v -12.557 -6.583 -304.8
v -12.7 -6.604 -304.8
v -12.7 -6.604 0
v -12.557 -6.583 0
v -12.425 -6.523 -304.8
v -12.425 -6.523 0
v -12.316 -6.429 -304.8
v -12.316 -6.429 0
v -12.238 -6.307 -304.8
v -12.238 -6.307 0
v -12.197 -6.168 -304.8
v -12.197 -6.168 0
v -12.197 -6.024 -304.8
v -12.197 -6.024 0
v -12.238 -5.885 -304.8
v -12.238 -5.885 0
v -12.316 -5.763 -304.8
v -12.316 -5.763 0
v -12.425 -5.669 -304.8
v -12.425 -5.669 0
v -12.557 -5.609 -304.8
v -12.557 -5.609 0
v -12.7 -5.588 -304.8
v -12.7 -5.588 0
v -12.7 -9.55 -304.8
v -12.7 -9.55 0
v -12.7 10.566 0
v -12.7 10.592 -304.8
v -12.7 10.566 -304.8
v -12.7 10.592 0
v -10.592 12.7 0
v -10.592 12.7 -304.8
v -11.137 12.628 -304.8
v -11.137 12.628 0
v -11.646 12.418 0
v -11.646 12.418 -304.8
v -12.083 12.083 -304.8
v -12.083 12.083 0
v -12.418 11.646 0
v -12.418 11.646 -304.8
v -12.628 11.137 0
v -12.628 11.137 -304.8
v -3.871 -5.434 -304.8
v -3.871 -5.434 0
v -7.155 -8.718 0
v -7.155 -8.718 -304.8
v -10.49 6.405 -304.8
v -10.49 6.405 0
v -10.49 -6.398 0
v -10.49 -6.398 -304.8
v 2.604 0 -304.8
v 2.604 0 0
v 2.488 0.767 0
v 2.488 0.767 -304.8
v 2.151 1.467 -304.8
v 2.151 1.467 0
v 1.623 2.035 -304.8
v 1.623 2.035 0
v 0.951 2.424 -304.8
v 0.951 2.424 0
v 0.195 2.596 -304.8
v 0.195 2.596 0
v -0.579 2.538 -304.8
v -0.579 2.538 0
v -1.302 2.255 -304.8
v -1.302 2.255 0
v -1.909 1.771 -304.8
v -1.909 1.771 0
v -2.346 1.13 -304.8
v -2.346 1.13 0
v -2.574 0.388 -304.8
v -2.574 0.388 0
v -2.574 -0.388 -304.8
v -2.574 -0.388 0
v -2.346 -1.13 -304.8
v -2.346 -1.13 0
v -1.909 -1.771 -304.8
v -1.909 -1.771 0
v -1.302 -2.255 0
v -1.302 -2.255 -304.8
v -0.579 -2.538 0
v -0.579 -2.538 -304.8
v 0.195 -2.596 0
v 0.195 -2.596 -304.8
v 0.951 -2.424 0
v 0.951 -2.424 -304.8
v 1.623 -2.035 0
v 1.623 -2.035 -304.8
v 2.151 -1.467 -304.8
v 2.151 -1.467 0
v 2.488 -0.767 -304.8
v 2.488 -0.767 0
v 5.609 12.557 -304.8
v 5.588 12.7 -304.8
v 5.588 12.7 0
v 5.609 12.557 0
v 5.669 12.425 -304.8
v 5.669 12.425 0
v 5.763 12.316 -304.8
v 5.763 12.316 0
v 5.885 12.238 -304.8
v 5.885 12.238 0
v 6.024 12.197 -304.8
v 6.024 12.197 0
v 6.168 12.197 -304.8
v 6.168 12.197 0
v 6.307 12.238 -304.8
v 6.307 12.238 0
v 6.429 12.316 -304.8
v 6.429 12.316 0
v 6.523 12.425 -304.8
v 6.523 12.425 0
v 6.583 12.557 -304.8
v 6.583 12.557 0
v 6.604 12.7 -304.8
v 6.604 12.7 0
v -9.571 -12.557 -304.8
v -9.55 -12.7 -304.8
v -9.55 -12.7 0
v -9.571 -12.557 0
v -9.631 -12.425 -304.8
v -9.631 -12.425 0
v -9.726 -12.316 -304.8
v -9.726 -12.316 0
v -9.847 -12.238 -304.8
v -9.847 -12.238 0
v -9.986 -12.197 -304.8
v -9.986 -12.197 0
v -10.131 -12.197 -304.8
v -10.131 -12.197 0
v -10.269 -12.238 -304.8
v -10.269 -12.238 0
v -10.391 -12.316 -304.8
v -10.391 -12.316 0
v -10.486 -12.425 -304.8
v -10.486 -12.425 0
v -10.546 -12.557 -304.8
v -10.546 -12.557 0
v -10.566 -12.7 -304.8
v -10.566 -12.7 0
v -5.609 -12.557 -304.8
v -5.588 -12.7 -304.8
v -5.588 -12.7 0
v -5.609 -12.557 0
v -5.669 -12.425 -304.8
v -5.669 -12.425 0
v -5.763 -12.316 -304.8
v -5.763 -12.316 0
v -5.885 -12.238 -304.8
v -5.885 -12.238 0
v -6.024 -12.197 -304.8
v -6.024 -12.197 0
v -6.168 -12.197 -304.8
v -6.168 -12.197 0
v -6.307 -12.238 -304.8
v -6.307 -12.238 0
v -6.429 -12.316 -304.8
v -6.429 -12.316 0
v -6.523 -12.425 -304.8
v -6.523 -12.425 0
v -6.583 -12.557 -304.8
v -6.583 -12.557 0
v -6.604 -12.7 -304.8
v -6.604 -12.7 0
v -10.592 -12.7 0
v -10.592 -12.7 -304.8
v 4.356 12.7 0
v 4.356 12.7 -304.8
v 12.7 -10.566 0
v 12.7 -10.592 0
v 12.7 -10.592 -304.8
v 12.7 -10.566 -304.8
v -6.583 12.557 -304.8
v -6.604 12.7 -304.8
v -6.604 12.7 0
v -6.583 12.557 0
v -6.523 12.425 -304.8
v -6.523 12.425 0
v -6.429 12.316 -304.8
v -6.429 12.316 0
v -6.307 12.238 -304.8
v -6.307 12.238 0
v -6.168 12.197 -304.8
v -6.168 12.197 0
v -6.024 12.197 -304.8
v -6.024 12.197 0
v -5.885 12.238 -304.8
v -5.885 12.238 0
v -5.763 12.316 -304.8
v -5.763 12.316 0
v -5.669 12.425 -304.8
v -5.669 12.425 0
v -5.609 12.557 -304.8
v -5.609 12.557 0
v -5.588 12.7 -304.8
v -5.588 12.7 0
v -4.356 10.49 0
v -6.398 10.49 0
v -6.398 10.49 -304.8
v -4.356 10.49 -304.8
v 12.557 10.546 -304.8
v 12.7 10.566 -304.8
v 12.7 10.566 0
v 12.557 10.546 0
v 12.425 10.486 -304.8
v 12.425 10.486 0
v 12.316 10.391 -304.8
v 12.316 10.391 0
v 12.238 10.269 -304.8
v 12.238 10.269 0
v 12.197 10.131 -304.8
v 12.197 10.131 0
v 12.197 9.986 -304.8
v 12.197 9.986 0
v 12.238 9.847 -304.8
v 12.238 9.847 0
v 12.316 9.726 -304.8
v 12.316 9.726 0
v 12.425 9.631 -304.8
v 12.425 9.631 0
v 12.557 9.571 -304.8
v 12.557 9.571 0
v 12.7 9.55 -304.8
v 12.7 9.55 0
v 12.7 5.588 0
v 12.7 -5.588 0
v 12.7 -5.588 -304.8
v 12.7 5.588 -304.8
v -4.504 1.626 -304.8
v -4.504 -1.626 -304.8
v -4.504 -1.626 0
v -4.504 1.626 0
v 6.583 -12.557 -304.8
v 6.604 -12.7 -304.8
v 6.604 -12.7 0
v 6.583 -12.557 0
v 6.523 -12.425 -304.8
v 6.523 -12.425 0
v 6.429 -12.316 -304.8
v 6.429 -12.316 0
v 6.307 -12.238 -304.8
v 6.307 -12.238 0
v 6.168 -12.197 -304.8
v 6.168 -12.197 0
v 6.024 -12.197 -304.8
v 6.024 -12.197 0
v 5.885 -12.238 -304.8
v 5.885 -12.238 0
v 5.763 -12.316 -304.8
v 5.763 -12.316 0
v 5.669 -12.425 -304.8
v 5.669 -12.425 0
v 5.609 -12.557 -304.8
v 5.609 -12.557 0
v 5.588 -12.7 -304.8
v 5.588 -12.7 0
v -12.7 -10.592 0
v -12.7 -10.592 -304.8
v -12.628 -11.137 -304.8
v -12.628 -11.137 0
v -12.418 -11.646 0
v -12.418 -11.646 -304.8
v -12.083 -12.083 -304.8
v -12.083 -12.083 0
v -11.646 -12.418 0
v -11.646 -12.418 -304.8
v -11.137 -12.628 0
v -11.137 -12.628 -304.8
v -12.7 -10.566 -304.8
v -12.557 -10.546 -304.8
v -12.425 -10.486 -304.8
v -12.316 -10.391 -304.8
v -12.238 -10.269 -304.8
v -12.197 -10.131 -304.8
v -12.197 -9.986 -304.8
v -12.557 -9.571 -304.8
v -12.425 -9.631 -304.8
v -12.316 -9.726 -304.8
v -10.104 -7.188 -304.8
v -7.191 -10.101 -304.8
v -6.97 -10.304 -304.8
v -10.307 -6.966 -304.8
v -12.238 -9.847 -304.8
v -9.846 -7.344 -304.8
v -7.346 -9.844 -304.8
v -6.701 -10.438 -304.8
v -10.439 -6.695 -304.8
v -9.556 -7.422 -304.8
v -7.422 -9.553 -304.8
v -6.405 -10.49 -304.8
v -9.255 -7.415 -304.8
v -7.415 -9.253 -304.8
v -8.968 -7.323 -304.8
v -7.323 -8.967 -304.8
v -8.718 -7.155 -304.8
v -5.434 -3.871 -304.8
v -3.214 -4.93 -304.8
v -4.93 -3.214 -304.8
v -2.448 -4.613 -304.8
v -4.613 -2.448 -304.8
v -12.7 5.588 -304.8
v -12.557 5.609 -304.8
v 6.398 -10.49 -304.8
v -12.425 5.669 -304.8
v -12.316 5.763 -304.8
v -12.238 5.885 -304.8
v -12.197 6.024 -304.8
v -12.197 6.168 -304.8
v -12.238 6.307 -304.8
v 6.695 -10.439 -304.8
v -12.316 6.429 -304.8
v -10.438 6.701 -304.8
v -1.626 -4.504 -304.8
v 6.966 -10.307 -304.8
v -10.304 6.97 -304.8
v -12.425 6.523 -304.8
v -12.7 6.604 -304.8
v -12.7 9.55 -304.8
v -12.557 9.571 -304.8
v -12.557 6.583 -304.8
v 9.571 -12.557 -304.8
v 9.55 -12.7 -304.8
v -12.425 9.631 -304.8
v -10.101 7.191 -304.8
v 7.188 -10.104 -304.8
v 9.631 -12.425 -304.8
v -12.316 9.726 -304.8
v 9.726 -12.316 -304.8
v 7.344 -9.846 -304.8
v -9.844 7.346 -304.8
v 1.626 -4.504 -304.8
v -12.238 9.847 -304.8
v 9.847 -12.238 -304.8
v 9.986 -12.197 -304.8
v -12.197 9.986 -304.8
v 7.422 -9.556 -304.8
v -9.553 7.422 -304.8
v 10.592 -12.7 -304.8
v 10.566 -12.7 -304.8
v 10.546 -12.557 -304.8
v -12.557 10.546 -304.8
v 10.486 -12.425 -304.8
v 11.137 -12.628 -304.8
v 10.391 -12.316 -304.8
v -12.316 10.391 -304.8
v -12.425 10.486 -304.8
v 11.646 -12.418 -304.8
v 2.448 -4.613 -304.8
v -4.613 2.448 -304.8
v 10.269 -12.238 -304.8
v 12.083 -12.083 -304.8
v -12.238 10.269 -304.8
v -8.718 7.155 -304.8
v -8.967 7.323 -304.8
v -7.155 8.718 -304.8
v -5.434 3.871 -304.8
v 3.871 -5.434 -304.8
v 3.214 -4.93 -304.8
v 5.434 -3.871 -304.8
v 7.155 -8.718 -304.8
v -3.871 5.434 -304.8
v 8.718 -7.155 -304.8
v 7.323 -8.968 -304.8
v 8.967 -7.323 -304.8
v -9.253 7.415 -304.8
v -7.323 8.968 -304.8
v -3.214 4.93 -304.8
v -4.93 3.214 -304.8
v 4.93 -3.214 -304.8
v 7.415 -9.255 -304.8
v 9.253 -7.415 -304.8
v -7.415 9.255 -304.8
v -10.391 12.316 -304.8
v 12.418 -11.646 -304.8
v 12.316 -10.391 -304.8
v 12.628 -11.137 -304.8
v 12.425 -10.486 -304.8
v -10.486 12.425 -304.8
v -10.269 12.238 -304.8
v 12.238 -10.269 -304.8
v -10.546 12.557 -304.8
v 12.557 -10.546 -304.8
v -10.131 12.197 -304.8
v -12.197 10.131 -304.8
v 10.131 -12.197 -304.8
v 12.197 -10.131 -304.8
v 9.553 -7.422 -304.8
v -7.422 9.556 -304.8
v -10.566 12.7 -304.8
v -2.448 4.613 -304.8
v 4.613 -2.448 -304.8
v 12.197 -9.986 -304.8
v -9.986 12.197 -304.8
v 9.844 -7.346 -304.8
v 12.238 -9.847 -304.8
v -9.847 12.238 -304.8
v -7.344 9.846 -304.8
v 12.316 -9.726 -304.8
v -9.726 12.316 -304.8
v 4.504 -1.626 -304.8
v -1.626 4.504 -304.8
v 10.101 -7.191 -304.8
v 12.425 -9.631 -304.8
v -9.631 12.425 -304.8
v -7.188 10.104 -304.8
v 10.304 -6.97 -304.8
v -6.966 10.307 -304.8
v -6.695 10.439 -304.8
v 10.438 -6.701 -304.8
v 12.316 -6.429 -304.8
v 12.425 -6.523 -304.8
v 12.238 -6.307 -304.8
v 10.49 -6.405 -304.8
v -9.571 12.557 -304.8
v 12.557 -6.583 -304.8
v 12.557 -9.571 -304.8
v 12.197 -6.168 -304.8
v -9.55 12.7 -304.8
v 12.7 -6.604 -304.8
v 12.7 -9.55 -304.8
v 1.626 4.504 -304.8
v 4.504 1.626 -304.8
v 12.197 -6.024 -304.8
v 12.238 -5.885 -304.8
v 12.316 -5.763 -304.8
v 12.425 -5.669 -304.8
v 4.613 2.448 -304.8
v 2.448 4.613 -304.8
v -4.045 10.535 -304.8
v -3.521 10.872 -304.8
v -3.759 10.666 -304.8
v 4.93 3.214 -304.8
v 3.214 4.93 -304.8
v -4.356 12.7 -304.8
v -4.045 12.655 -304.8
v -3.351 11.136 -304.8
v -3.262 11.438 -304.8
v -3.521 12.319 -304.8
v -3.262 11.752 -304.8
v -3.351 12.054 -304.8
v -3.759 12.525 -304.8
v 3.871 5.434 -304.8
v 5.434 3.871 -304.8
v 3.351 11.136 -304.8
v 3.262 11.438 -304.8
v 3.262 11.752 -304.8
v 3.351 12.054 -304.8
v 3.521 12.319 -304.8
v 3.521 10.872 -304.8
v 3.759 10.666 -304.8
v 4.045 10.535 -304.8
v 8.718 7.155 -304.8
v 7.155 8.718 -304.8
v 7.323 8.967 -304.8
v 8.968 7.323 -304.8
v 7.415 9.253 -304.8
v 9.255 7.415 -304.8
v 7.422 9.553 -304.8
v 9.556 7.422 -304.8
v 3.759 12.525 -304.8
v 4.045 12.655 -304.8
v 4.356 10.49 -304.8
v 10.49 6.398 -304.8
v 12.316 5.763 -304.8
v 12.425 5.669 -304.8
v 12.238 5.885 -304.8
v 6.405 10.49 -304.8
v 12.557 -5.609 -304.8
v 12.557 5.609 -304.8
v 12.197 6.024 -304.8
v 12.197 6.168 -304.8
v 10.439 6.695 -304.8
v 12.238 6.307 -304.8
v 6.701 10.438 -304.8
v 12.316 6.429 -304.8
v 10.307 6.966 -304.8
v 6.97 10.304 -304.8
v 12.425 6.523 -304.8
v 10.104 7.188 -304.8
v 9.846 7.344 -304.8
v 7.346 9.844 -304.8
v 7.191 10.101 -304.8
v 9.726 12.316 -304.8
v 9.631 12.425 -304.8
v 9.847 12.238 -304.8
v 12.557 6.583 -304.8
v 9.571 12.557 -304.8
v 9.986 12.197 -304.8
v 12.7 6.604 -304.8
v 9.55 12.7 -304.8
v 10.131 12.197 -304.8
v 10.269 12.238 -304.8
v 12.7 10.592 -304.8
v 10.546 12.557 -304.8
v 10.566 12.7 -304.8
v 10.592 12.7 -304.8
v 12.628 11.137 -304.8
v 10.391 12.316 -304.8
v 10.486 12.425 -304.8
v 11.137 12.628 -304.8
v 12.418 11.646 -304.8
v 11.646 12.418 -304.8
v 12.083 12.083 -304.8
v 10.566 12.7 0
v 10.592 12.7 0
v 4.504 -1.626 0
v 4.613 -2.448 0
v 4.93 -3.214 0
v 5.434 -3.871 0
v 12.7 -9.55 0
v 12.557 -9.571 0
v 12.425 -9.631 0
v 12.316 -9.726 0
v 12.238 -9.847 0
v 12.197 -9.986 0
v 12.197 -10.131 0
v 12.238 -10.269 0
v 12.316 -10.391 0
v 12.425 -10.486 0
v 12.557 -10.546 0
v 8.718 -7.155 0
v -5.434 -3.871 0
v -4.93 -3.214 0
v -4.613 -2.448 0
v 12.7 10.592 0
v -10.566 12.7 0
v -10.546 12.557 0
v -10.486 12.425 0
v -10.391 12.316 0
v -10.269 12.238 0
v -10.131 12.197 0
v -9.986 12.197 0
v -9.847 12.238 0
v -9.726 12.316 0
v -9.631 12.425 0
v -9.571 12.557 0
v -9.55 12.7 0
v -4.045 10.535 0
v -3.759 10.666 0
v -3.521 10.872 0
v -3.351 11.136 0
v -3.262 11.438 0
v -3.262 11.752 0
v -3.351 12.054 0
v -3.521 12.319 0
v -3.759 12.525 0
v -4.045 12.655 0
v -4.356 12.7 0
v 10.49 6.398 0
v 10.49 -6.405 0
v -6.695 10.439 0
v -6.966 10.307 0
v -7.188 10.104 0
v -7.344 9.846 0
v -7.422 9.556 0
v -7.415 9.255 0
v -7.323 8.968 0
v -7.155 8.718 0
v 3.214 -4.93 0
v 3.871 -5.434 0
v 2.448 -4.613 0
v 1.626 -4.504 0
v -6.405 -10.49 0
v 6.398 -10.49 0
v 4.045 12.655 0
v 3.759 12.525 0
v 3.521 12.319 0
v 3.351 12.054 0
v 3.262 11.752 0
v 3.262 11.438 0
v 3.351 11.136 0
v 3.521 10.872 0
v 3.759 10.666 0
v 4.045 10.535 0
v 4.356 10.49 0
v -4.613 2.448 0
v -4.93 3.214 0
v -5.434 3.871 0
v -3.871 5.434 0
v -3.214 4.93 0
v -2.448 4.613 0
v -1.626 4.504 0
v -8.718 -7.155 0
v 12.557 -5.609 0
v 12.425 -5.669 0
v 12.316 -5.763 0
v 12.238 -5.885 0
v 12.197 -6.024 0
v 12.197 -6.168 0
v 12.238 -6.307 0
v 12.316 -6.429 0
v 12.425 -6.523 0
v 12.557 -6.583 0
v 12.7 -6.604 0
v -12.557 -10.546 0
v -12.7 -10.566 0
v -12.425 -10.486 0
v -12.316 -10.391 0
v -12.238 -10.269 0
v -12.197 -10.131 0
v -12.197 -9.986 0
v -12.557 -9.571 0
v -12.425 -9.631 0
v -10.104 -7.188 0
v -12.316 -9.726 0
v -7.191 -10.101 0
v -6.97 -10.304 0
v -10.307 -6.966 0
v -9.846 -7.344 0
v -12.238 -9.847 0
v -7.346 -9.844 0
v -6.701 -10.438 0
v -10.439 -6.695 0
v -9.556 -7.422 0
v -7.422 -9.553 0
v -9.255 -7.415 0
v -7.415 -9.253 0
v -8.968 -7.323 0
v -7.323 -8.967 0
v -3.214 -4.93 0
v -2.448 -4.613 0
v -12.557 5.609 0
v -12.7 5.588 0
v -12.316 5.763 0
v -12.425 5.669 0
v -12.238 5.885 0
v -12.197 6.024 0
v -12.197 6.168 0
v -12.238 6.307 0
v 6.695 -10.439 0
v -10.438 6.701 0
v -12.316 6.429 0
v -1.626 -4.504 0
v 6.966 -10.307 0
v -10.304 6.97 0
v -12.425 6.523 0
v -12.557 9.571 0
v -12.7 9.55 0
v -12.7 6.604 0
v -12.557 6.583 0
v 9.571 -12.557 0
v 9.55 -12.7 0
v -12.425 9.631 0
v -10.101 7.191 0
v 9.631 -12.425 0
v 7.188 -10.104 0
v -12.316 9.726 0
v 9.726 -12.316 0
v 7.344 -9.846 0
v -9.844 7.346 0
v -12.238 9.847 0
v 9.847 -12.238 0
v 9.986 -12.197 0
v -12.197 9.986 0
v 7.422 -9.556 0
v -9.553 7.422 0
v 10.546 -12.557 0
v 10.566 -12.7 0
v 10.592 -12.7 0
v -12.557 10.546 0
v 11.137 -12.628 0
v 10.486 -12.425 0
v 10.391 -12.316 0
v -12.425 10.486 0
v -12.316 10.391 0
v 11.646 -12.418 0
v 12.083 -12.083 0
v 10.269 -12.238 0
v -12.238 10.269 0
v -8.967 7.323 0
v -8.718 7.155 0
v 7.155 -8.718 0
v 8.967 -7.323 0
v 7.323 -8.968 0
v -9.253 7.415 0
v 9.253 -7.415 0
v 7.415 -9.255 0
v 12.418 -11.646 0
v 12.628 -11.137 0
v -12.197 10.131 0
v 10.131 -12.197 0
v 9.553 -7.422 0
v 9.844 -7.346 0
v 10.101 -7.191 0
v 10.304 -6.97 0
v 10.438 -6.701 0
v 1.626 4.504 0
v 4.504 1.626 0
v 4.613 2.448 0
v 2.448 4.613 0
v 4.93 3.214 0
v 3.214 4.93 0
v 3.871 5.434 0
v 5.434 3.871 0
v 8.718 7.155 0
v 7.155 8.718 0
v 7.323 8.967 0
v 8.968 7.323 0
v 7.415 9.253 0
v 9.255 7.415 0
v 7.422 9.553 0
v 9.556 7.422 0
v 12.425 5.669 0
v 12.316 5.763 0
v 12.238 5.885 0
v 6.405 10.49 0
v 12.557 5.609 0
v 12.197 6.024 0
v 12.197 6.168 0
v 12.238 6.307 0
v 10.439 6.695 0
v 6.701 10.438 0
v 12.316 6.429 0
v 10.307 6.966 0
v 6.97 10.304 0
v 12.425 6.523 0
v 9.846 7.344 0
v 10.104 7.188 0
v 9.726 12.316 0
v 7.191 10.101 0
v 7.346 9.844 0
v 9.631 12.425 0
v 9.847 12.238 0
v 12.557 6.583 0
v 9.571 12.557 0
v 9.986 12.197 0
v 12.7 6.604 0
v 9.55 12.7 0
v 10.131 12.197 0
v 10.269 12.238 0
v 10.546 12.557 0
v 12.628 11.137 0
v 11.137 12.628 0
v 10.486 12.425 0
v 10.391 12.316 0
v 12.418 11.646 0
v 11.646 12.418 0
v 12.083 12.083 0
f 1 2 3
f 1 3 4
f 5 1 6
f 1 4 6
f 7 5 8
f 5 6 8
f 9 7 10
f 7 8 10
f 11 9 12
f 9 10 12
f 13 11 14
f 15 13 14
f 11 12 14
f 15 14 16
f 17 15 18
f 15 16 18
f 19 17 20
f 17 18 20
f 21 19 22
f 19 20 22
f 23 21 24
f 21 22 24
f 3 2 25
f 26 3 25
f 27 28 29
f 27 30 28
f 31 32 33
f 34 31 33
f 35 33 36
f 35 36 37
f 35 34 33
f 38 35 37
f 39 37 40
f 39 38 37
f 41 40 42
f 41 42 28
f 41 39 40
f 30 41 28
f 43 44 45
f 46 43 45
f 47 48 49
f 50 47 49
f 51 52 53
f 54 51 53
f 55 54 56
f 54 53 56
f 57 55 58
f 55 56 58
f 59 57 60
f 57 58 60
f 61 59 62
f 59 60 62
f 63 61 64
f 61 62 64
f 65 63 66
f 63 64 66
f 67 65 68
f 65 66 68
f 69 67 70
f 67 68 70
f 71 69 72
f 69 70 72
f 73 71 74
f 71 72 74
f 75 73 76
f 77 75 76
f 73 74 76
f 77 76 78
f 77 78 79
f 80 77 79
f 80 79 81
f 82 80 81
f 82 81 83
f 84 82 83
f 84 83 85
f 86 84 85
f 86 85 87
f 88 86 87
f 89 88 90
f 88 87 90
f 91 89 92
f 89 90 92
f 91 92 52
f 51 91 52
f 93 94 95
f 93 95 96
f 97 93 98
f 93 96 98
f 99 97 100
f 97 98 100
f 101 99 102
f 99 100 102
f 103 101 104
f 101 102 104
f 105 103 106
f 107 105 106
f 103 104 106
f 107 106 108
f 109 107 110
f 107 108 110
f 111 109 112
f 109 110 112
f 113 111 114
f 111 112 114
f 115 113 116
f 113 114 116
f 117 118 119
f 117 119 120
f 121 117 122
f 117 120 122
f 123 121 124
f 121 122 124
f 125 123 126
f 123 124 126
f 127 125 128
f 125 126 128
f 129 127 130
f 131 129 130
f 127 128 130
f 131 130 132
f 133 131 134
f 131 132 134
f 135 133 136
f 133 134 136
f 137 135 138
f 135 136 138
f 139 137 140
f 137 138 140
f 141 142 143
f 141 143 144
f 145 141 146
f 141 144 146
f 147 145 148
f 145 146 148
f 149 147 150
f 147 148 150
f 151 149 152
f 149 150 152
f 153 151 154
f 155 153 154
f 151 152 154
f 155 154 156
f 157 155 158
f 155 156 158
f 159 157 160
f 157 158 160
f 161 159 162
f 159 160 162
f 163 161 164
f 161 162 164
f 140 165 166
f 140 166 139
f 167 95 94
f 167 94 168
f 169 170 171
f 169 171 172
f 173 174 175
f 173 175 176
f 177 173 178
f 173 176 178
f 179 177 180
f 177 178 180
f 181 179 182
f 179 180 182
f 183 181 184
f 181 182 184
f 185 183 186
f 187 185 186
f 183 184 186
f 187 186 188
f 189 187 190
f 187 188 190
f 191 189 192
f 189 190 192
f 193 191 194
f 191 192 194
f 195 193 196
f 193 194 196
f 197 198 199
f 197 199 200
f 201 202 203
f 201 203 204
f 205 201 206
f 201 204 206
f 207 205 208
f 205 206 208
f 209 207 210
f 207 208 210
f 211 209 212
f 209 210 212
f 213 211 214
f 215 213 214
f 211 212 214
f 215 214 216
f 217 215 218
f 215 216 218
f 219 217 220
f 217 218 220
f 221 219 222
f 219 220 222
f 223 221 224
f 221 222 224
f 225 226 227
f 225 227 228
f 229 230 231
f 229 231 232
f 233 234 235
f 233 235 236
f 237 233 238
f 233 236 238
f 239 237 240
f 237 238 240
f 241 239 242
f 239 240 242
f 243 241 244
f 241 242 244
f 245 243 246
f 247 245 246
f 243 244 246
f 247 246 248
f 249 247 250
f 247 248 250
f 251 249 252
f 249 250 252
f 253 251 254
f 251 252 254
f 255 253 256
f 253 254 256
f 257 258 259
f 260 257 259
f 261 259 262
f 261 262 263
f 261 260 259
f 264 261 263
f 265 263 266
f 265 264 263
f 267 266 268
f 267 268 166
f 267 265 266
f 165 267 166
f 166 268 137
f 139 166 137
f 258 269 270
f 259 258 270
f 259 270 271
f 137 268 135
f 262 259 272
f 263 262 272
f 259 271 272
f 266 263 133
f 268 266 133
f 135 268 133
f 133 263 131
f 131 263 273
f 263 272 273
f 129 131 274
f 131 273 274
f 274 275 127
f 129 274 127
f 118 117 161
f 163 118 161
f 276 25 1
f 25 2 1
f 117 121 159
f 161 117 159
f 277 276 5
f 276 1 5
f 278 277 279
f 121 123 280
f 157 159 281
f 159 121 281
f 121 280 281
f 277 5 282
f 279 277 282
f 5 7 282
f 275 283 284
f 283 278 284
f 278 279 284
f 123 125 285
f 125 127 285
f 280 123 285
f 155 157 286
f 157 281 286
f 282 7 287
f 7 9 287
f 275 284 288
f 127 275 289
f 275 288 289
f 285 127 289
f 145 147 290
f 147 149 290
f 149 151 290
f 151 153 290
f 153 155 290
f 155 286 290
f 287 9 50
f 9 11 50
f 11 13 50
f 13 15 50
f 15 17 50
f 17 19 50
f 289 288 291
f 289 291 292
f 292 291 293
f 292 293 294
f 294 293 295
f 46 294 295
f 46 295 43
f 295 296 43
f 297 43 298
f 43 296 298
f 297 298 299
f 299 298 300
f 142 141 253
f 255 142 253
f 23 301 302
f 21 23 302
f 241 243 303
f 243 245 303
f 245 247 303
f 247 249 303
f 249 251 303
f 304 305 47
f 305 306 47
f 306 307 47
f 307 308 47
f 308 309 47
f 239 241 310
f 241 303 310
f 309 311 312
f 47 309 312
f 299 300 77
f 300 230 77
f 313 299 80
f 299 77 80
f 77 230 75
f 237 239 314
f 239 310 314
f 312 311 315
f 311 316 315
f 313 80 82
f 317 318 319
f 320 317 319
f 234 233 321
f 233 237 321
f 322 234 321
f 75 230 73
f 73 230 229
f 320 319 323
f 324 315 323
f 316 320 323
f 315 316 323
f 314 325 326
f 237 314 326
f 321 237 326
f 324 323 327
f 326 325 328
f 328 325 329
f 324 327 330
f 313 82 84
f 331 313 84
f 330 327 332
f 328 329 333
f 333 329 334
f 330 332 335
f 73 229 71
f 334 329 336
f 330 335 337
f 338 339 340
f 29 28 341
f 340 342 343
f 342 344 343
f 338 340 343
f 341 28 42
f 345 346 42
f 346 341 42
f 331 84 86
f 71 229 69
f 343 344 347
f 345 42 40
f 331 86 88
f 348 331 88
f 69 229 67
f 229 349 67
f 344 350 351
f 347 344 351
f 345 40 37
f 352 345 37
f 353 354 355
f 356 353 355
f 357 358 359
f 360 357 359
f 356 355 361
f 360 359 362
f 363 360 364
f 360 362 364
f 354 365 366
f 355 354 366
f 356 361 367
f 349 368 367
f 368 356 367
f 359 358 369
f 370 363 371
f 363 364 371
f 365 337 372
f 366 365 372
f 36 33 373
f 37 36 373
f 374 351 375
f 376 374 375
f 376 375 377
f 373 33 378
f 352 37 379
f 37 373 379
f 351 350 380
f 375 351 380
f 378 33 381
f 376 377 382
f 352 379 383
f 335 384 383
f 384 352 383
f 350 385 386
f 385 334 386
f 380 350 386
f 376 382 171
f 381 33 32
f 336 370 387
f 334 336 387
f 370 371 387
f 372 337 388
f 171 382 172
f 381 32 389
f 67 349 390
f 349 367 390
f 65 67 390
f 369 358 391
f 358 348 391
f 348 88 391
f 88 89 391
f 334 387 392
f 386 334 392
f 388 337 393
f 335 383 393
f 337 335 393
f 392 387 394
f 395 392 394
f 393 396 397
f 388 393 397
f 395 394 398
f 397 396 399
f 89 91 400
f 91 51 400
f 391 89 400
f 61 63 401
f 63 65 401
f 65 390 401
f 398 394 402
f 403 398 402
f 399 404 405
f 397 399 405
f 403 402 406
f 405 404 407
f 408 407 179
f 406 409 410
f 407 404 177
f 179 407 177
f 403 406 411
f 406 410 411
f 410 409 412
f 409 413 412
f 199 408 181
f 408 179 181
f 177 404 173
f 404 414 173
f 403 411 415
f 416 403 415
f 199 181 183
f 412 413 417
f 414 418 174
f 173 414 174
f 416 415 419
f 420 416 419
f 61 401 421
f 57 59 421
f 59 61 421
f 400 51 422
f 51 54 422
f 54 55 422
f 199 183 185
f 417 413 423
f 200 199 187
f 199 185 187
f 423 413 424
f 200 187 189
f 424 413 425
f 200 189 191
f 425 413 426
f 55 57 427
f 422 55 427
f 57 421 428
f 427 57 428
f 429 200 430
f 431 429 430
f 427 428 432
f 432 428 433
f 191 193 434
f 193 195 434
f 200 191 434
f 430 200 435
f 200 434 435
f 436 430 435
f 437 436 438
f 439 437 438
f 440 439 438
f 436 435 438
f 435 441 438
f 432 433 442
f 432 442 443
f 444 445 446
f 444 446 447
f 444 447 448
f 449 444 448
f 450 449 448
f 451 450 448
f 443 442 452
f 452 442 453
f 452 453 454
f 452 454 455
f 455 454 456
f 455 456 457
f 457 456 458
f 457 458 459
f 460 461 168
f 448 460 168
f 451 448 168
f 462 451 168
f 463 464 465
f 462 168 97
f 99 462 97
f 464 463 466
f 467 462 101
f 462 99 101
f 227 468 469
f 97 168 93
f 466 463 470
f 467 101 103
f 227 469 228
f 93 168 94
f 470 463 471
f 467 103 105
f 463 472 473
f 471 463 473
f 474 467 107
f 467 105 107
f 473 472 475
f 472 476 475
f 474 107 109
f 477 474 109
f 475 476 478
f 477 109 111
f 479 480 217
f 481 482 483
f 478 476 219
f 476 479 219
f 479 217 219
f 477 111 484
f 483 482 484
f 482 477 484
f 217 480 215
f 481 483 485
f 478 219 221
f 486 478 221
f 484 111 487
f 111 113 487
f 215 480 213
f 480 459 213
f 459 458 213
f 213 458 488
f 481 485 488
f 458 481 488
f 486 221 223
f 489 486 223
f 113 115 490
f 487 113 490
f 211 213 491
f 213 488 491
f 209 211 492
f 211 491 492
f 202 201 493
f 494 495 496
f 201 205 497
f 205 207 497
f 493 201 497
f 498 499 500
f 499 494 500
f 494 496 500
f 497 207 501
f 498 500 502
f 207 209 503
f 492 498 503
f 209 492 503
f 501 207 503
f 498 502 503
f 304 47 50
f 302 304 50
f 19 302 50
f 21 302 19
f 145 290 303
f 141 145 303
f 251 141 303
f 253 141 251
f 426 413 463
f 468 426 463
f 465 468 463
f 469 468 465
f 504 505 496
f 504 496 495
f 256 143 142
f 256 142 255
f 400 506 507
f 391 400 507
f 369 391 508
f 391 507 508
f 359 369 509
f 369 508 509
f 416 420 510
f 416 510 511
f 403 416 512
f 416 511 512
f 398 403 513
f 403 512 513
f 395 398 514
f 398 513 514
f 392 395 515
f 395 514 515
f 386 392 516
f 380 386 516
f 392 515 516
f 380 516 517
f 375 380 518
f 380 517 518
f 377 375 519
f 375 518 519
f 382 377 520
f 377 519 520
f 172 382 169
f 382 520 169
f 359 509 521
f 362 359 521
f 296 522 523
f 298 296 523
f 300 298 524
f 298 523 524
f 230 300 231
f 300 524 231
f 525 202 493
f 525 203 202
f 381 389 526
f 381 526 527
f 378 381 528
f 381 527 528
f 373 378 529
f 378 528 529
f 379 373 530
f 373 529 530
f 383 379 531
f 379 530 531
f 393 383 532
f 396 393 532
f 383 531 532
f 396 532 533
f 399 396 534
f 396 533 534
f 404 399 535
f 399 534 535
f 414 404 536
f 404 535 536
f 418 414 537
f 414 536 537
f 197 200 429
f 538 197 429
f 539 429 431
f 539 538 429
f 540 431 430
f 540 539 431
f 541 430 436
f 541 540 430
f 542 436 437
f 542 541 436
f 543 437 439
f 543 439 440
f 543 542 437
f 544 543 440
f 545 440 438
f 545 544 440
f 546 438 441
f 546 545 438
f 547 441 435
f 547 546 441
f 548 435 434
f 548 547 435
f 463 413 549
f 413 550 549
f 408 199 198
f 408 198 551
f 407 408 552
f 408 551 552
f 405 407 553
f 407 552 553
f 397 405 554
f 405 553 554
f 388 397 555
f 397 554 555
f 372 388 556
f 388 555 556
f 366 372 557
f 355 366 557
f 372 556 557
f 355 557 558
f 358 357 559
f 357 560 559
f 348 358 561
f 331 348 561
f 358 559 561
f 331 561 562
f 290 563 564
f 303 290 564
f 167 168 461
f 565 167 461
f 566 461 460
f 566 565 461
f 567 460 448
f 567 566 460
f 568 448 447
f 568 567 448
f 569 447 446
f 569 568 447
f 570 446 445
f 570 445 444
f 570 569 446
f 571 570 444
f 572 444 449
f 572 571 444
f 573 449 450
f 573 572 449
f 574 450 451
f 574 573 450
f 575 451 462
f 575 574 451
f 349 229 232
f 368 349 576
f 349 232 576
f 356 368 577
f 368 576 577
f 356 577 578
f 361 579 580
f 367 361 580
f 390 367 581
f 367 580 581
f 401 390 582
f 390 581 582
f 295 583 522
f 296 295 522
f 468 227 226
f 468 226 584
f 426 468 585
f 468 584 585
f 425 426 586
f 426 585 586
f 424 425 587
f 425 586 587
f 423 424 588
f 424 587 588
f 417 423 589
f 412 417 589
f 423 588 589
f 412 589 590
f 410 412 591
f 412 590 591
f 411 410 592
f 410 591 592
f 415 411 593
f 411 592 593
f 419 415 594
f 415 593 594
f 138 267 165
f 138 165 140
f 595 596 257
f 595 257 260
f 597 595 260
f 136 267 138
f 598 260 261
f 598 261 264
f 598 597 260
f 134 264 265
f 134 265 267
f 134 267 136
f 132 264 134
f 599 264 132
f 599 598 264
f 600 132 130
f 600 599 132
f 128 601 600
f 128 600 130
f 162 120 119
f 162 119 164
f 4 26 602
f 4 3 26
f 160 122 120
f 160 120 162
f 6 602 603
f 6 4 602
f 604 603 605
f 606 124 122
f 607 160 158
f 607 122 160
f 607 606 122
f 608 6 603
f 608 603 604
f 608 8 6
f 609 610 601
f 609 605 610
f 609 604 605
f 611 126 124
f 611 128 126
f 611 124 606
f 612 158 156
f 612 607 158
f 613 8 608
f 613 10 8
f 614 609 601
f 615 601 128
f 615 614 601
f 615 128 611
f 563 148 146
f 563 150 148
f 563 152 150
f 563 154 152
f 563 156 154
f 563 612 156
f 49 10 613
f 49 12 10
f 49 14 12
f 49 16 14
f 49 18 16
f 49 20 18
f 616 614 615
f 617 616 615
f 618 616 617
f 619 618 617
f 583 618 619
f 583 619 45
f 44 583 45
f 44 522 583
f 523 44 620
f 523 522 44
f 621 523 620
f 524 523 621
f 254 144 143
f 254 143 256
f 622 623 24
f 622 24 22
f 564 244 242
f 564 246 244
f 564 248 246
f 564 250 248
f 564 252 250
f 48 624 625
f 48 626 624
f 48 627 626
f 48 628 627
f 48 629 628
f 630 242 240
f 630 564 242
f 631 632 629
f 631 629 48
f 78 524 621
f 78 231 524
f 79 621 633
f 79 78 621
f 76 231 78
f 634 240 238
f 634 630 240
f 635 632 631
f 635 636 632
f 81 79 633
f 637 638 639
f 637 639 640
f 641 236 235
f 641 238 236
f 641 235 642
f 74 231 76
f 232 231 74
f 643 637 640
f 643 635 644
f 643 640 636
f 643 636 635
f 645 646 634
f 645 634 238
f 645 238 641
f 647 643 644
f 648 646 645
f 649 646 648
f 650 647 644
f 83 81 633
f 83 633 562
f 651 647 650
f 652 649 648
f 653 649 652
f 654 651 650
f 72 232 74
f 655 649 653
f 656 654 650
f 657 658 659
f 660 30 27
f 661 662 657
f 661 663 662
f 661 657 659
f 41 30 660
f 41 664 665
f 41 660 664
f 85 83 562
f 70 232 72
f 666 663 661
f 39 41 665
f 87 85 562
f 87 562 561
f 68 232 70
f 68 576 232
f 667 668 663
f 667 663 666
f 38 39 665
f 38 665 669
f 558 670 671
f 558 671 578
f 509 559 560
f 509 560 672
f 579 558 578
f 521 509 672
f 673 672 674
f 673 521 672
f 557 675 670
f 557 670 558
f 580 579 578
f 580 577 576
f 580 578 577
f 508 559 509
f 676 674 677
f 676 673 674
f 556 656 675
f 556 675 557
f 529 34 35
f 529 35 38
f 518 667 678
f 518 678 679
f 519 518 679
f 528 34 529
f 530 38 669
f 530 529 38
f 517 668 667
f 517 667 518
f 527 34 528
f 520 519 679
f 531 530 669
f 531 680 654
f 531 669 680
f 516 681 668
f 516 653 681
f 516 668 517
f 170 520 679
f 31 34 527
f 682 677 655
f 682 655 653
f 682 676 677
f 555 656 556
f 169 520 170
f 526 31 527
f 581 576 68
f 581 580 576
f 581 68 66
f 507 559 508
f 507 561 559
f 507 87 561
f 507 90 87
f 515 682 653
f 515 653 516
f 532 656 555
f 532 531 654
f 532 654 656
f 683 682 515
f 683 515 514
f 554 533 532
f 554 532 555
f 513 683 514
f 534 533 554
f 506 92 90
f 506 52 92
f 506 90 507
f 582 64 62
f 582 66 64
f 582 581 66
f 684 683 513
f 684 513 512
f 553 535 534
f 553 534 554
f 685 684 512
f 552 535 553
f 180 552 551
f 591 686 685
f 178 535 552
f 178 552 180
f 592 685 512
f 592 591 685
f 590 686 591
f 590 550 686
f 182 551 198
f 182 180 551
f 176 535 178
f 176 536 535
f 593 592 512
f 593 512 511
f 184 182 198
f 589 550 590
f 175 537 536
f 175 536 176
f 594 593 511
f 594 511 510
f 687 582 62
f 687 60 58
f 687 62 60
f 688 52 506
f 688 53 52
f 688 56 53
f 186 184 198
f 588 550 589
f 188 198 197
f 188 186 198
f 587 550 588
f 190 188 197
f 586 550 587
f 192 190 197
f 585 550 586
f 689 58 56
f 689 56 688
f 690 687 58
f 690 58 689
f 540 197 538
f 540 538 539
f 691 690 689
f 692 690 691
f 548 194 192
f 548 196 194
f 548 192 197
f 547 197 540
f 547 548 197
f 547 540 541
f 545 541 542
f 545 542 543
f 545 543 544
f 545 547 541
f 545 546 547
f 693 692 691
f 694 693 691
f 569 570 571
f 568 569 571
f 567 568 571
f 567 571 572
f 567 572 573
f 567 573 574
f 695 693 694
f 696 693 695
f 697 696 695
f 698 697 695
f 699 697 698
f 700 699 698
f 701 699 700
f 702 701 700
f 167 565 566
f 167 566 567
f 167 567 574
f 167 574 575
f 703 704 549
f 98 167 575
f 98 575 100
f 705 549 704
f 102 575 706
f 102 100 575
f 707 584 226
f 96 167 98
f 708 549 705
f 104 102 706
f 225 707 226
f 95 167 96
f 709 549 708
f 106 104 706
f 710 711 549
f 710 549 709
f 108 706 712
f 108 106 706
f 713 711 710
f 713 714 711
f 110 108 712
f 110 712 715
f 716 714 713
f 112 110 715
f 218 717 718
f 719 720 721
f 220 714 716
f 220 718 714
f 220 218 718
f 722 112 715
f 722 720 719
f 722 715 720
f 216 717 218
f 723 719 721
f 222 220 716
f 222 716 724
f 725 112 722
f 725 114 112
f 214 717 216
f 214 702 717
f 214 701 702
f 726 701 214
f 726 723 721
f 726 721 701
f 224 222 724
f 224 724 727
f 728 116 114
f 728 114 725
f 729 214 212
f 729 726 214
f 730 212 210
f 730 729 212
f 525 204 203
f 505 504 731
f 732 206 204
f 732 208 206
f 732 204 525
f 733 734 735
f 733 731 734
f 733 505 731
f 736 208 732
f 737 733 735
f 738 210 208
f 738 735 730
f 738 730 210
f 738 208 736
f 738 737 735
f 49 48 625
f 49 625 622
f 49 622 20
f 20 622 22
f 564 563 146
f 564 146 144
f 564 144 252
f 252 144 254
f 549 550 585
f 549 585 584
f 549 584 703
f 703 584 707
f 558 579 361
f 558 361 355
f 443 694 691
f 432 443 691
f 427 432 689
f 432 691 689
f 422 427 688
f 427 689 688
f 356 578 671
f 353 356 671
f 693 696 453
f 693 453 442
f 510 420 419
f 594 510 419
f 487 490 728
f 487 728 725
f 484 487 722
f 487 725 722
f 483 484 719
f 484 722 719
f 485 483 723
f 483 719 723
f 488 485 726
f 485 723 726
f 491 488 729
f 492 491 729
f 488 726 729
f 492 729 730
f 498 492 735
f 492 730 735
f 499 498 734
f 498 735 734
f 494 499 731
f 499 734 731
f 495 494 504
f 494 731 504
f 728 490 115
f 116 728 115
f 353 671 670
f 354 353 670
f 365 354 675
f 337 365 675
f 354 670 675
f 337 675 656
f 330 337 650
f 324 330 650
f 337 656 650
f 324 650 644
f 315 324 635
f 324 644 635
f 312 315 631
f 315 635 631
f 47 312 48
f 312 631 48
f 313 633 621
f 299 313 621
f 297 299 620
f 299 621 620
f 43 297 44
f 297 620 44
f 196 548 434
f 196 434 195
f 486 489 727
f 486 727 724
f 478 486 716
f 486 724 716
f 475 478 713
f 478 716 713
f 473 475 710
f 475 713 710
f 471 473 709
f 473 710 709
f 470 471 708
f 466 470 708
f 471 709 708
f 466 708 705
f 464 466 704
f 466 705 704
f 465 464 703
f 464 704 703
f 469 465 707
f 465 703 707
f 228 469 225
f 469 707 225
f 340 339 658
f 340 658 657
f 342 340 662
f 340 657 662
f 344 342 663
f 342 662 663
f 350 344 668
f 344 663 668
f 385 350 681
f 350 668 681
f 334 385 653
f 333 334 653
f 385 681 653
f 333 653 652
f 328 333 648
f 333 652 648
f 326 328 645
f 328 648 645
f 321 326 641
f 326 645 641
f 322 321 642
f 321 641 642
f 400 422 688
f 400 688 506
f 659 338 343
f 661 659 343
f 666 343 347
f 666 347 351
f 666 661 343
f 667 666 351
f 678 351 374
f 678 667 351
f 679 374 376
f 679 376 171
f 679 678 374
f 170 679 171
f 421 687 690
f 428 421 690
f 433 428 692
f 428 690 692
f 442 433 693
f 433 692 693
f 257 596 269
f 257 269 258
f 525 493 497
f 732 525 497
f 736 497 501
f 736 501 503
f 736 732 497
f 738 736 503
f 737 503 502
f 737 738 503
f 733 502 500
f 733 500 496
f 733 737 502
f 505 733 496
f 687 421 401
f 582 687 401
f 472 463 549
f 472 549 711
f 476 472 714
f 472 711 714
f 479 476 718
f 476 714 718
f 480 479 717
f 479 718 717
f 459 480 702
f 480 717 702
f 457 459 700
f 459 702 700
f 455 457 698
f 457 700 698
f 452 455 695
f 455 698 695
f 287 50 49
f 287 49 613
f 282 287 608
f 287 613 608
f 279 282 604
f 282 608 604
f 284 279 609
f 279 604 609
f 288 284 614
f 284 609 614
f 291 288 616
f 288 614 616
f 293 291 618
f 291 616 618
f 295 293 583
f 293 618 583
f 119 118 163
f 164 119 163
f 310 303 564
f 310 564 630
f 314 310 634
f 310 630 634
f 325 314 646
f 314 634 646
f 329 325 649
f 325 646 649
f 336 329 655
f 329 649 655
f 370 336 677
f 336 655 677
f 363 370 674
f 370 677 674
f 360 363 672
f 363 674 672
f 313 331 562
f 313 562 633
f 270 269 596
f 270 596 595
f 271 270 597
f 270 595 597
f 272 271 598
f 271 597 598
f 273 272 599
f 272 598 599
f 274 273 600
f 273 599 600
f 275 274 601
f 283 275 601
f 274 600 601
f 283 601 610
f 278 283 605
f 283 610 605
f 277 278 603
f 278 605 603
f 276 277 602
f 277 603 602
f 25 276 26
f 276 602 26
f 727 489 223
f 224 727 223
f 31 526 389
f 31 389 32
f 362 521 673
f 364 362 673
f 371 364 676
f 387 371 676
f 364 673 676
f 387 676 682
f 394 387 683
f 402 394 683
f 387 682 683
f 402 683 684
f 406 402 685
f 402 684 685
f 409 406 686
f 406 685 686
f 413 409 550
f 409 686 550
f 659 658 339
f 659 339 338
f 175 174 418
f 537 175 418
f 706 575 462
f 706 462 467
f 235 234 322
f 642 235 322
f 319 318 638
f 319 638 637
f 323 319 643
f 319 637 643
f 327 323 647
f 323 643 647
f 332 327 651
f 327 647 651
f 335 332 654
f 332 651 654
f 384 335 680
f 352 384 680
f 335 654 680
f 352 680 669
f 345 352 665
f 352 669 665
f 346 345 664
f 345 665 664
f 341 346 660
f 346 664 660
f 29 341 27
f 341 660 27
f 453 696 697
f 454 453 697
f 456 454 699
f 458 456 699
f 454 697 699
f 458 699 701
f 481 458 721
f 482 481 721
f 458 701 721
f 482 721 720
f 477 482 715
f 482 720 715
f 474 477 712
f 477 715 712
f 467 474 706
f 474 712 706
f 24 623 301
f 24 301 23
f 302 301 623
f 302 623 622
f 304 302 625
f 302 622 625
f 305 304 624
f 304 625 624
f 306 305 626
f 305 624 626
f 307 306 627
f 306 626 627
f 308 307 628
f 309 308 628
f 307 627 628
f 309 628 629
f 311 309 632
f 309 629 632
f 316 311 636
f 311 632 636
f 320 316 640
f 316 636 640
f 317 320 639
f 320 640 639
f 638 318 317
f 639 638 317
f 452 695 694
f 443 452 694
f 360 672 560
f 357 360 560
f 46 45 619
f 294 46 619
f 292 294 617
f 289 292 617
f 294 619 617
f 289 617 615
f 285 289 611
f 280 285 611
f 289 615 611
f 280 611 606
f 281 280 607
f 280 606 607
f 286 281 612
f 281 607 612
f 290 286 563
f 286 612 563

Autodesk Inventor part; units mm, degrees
ref_plane "YZ Plane" through (0, 0, 0) normal (1, 0, 0) x (0, 1, 0)
ref_plane "XZ Plane" through (0, 0, 0) normal (0, 1, 0) x (-1, 0, 0)
ref_plane "XY Plane" through (0, 0, 0) normal (0, 0, 1) x (1, 0, 0)
sketch "Sketch1" plane through (0, 0, 0) normal (0, 0, 1) x (1, 0, 0)
  arc A0 (-1.6262, -4.5044) -> (-3.8713, -5.4343) centre (-1.6262, -7.6794) ccw
  line L0 (1.6262, -4.5044) -> (-1.6262, -4.5044)
  arc A1 (3.8713, -5.4343) -> (1.6262, -4.5044) centre (1.6262, -7.6794) ccw
  line L1 (7.1551, -8.7181) -> (3.8713, -5.4343)
  arc A2 (6.3985, -10.4902) -> (7.1551, -8.7181) centre (6.3689, -9.43) ccw
  line L2 (-6.4049, -10.4902) -> (6.3985, -10.4902)
  arc A3 (-7.1552, -8.7184) -> (-6.4049, -10.4902) centre (-6.369, -9.4302) ccw
  line L3 (-3.8713, -5.4343) -> (-7.1552, -8.7184)
  circle A4 centre (0, 0) radius 2.6035
  arc A5 (-4.5044, 1.6262) -> (-5.4343, 3.8713) centre (-7.6794, 1.6262) ccw
  line L4 (-4.5044, -1.6262) -> (-4.5044, 1.6262)
  arc A6 (-5.4343, -3.8713) -> (-4.5044, -1.6262) centre (-7.6794, -1.6262) ccw
  line L5 (-8.7181, -7.1551) -> (-5.4343, -3.8713)
  arc A7 (-10.4902, -6.3985) -> (-8.7181, -7.1551) centre (-9.43, -6.3689) ccw
  line L6 (-10.4902, 6.4049) -> (-10.4902, -6.3985)
  arc A8 (-8.7184, 7.1552) -> (-10.4902, 6.4049) centre (-9.4302, 6.369) ccw
  line L7 (-5.4343, 3.8713) -> (-8.7184, 7.1552)
  arc A9 (8.7184, -7.1552) -> (10.4902, -6.4049) centre (9.4302, -6.369) ccw
  line L8 (5.4343, -3.8713) -> (8.7184, -7.1552)
  arc A10 (4.5044, -1.6262) -> (5.4343, -3.8713) centre (7.6794, -1.6262) ccw
  line L9 (4.5044, 1.6262) -> (4.5044, -1.6262)
  arc A11 (5.4343, 3.8713) -> (4.5044, 1.6262) centre (7.6794, 1.6262) ccw
  line L10 (8.7181, 7.1551) -> (5.4343, 3.8713)
  arc A12 (10.4902, 6.3985) -> (8.7181, 7.1551) centre (9.43, 6.3689) ccw
  line L11 (10.4902, -6.4049) -> (10.4902, 6.3985)
  arc A13 (12.7, -9.5504) -> (12.7, -10.5664) centre (12.7, -10.0584) ccw
  line L12 (12.7, -9.5504) -> (12.7, -6.604)
  arc A14 (12.7, -5.588) -> (12.7, -6.604) centre (12.7, -6.096) ccw
  line L13 (12.7, -5.588) -> (12.7, 5.588)
  arc A15 (12.7, 6.604) -> (12.7, 5.588) centre (12.7, 6.096) ccw
  line L14 (12.7, 6.604) -> (12.7, 9.5504)
  arc A16 (12.7, 10.5664) -> (12.7, 9.5504) centre (12.7, 10.0584) ccw
  line L15 (12.7, 10.5664) -> (12.7, 10.5918)
  arc A17 (12.7, 10.5918) -> (10.5918, 12.7) centre (10.5918, 10.5918) ccw
  line L16 (10.5918, 12.7) -> (10.5664, 12.7)
  arc A18 (9.5504, 12.7) -> (10.5664, 12.7) centre (10.0584, 12.7) ccw
  line L17 (9.5504, 12.7) -> (6.604, 12.7)
  arc A19 (5.588, 12.7) -> (6.604, 12.7) centre (6.096, 12.7) ccw
  line L18 (5.588, 12.7) -> (4.3561, 12.7)
  arc A20 (4.3561, 12.7) -> (4.3561, 10.4902) centre (4.3561, 11.5951) ccw
  line L19 (4.3561, 10.4902) -> (6.4049, 10.4902)
  arc A21 (7.1552, 8.7184) -> (6.4049, 10.4902) centre (6.369, 9.4302) ccw
  line L20 (7.1552, 8.7184) -> (3.8713, 5.4343)
  arc A22 (1.6262, 4.5044) -> (3.8713, 5.4343) centre (1.6262, 7.6794) ccw
  line L21 (1.6262, 4.5044) -> (-1.6262, 4.5044)
  arc A23 (-3.8713, 5.4343) -> (-1.6262, 4.5044) centre (-1.6262, 7.6794) ccw
  line L22 (-3.8713, 5.4343) -> (-7.1551, 8.7181)
  arc A24 (-6.3985, 10.4902) -> (-7.1551, 8.7181) centre (-6.3689, 9.43) ccw
  line L23 (-6.3985, 10.4902) -> (-4.3561, 10.4902)
  arc A25 (-4.3561, 10.4902) -> (-4.3561, 12.7) centre (-4.3561, 11.5951) ccw
  line L24 (-4.3561, 12.7) -> (-5.588, 12.7)
  arc A26 (-6.604, 12.7) -> (-5.588, 12.7) centre (-6.096, 12.7) ccw
  line L25 (-6.604, 12.7) -> (-9.5504, 12.7)
  arc A27 (-10.5664, 12.7) -> (-9.5504, 12.7) centre (-10.0584, 12.7) ccw
  line L26 (-10.5664, 12.7) -> (-10.5918, 12.7)
  arc A28 (-10.5918, 12.7) -> (-12.7, 10.5918) centre (-10.5918, 10.5918) ccw
  line L27 (-12.7, 10.5918) -> (-12.7, 10.5664)
  arc A29 (-12.7, 9.5504) -> (-12.7, 10.5664) centre (-12.7, 10.0584) ccw
  line L28 (-12.7, 9.5504) -> (-12.7, 6.604)
  arc A30 (-12.7, 5.588) -> (-12.7, 6.604) centre (-12.7, 6.096) ccw
  line L29 (-12.7, 5.588) -> (-12.7, -5.588)
  arc A31 (-12.7, -6.604) -> (-12.7, -5.588) centre (-12.7, -6.096) ccw
  line L30 (-12.7, -6.604) -> (-12.7, -9.5504)
  arc A32 (-12.7, -10.5664) -> (-12.7, -9.5504) centre (-12.7, -10.0584) ccw
  line L31 (-12.7, -10.5664) -> (-12.7, -10.5918)
  arc A33 (-12.7, -10.5918) -> (-10.5918, -12.7) centre (-10.5918, -10.5918) ccw
  line L32 (-10.5918, -12.7) -> (-10.5664, -12.7)
  arc A34 (-9.5504, -12.7) -> (-10.5664, -12.7) centre (-10.0584, -12.7) ccw
  line L33 (-9.5504, -12.7) -> (-6.604, -12.7)
  arc A35 (-5.588, -12.7) -> (-6.604, -12.7) centre (-6.096, -12.7) ccw
  line L34 (-5.588, -12.7) -> (5.588, -12.7)
  arc A36 (6.604, -12.7) -> (5.588, -12.7) centre (6.096, -12.7) ccw
  line L35 (6.604, -12.7) -> (9.5504, -12.7)
  arc A37 (10.5664, -12.7) -> (9.5504, -12.7) centre (10.0584, -12.7) ccw
  line L36 (10.5664, -12.7) -> (10.5918, -12.7)
  arc A38 (10.5918, -12.7) -> (12.7, -10.5918) centre (10.5918, -10.5918) ccw
  line L37 (12.7, -10.5918) -> (12.7, -10.5664)
extrude "Extrusion1" add sketch "Sketch1" against normal blind 304.8
properties part number "1001"
